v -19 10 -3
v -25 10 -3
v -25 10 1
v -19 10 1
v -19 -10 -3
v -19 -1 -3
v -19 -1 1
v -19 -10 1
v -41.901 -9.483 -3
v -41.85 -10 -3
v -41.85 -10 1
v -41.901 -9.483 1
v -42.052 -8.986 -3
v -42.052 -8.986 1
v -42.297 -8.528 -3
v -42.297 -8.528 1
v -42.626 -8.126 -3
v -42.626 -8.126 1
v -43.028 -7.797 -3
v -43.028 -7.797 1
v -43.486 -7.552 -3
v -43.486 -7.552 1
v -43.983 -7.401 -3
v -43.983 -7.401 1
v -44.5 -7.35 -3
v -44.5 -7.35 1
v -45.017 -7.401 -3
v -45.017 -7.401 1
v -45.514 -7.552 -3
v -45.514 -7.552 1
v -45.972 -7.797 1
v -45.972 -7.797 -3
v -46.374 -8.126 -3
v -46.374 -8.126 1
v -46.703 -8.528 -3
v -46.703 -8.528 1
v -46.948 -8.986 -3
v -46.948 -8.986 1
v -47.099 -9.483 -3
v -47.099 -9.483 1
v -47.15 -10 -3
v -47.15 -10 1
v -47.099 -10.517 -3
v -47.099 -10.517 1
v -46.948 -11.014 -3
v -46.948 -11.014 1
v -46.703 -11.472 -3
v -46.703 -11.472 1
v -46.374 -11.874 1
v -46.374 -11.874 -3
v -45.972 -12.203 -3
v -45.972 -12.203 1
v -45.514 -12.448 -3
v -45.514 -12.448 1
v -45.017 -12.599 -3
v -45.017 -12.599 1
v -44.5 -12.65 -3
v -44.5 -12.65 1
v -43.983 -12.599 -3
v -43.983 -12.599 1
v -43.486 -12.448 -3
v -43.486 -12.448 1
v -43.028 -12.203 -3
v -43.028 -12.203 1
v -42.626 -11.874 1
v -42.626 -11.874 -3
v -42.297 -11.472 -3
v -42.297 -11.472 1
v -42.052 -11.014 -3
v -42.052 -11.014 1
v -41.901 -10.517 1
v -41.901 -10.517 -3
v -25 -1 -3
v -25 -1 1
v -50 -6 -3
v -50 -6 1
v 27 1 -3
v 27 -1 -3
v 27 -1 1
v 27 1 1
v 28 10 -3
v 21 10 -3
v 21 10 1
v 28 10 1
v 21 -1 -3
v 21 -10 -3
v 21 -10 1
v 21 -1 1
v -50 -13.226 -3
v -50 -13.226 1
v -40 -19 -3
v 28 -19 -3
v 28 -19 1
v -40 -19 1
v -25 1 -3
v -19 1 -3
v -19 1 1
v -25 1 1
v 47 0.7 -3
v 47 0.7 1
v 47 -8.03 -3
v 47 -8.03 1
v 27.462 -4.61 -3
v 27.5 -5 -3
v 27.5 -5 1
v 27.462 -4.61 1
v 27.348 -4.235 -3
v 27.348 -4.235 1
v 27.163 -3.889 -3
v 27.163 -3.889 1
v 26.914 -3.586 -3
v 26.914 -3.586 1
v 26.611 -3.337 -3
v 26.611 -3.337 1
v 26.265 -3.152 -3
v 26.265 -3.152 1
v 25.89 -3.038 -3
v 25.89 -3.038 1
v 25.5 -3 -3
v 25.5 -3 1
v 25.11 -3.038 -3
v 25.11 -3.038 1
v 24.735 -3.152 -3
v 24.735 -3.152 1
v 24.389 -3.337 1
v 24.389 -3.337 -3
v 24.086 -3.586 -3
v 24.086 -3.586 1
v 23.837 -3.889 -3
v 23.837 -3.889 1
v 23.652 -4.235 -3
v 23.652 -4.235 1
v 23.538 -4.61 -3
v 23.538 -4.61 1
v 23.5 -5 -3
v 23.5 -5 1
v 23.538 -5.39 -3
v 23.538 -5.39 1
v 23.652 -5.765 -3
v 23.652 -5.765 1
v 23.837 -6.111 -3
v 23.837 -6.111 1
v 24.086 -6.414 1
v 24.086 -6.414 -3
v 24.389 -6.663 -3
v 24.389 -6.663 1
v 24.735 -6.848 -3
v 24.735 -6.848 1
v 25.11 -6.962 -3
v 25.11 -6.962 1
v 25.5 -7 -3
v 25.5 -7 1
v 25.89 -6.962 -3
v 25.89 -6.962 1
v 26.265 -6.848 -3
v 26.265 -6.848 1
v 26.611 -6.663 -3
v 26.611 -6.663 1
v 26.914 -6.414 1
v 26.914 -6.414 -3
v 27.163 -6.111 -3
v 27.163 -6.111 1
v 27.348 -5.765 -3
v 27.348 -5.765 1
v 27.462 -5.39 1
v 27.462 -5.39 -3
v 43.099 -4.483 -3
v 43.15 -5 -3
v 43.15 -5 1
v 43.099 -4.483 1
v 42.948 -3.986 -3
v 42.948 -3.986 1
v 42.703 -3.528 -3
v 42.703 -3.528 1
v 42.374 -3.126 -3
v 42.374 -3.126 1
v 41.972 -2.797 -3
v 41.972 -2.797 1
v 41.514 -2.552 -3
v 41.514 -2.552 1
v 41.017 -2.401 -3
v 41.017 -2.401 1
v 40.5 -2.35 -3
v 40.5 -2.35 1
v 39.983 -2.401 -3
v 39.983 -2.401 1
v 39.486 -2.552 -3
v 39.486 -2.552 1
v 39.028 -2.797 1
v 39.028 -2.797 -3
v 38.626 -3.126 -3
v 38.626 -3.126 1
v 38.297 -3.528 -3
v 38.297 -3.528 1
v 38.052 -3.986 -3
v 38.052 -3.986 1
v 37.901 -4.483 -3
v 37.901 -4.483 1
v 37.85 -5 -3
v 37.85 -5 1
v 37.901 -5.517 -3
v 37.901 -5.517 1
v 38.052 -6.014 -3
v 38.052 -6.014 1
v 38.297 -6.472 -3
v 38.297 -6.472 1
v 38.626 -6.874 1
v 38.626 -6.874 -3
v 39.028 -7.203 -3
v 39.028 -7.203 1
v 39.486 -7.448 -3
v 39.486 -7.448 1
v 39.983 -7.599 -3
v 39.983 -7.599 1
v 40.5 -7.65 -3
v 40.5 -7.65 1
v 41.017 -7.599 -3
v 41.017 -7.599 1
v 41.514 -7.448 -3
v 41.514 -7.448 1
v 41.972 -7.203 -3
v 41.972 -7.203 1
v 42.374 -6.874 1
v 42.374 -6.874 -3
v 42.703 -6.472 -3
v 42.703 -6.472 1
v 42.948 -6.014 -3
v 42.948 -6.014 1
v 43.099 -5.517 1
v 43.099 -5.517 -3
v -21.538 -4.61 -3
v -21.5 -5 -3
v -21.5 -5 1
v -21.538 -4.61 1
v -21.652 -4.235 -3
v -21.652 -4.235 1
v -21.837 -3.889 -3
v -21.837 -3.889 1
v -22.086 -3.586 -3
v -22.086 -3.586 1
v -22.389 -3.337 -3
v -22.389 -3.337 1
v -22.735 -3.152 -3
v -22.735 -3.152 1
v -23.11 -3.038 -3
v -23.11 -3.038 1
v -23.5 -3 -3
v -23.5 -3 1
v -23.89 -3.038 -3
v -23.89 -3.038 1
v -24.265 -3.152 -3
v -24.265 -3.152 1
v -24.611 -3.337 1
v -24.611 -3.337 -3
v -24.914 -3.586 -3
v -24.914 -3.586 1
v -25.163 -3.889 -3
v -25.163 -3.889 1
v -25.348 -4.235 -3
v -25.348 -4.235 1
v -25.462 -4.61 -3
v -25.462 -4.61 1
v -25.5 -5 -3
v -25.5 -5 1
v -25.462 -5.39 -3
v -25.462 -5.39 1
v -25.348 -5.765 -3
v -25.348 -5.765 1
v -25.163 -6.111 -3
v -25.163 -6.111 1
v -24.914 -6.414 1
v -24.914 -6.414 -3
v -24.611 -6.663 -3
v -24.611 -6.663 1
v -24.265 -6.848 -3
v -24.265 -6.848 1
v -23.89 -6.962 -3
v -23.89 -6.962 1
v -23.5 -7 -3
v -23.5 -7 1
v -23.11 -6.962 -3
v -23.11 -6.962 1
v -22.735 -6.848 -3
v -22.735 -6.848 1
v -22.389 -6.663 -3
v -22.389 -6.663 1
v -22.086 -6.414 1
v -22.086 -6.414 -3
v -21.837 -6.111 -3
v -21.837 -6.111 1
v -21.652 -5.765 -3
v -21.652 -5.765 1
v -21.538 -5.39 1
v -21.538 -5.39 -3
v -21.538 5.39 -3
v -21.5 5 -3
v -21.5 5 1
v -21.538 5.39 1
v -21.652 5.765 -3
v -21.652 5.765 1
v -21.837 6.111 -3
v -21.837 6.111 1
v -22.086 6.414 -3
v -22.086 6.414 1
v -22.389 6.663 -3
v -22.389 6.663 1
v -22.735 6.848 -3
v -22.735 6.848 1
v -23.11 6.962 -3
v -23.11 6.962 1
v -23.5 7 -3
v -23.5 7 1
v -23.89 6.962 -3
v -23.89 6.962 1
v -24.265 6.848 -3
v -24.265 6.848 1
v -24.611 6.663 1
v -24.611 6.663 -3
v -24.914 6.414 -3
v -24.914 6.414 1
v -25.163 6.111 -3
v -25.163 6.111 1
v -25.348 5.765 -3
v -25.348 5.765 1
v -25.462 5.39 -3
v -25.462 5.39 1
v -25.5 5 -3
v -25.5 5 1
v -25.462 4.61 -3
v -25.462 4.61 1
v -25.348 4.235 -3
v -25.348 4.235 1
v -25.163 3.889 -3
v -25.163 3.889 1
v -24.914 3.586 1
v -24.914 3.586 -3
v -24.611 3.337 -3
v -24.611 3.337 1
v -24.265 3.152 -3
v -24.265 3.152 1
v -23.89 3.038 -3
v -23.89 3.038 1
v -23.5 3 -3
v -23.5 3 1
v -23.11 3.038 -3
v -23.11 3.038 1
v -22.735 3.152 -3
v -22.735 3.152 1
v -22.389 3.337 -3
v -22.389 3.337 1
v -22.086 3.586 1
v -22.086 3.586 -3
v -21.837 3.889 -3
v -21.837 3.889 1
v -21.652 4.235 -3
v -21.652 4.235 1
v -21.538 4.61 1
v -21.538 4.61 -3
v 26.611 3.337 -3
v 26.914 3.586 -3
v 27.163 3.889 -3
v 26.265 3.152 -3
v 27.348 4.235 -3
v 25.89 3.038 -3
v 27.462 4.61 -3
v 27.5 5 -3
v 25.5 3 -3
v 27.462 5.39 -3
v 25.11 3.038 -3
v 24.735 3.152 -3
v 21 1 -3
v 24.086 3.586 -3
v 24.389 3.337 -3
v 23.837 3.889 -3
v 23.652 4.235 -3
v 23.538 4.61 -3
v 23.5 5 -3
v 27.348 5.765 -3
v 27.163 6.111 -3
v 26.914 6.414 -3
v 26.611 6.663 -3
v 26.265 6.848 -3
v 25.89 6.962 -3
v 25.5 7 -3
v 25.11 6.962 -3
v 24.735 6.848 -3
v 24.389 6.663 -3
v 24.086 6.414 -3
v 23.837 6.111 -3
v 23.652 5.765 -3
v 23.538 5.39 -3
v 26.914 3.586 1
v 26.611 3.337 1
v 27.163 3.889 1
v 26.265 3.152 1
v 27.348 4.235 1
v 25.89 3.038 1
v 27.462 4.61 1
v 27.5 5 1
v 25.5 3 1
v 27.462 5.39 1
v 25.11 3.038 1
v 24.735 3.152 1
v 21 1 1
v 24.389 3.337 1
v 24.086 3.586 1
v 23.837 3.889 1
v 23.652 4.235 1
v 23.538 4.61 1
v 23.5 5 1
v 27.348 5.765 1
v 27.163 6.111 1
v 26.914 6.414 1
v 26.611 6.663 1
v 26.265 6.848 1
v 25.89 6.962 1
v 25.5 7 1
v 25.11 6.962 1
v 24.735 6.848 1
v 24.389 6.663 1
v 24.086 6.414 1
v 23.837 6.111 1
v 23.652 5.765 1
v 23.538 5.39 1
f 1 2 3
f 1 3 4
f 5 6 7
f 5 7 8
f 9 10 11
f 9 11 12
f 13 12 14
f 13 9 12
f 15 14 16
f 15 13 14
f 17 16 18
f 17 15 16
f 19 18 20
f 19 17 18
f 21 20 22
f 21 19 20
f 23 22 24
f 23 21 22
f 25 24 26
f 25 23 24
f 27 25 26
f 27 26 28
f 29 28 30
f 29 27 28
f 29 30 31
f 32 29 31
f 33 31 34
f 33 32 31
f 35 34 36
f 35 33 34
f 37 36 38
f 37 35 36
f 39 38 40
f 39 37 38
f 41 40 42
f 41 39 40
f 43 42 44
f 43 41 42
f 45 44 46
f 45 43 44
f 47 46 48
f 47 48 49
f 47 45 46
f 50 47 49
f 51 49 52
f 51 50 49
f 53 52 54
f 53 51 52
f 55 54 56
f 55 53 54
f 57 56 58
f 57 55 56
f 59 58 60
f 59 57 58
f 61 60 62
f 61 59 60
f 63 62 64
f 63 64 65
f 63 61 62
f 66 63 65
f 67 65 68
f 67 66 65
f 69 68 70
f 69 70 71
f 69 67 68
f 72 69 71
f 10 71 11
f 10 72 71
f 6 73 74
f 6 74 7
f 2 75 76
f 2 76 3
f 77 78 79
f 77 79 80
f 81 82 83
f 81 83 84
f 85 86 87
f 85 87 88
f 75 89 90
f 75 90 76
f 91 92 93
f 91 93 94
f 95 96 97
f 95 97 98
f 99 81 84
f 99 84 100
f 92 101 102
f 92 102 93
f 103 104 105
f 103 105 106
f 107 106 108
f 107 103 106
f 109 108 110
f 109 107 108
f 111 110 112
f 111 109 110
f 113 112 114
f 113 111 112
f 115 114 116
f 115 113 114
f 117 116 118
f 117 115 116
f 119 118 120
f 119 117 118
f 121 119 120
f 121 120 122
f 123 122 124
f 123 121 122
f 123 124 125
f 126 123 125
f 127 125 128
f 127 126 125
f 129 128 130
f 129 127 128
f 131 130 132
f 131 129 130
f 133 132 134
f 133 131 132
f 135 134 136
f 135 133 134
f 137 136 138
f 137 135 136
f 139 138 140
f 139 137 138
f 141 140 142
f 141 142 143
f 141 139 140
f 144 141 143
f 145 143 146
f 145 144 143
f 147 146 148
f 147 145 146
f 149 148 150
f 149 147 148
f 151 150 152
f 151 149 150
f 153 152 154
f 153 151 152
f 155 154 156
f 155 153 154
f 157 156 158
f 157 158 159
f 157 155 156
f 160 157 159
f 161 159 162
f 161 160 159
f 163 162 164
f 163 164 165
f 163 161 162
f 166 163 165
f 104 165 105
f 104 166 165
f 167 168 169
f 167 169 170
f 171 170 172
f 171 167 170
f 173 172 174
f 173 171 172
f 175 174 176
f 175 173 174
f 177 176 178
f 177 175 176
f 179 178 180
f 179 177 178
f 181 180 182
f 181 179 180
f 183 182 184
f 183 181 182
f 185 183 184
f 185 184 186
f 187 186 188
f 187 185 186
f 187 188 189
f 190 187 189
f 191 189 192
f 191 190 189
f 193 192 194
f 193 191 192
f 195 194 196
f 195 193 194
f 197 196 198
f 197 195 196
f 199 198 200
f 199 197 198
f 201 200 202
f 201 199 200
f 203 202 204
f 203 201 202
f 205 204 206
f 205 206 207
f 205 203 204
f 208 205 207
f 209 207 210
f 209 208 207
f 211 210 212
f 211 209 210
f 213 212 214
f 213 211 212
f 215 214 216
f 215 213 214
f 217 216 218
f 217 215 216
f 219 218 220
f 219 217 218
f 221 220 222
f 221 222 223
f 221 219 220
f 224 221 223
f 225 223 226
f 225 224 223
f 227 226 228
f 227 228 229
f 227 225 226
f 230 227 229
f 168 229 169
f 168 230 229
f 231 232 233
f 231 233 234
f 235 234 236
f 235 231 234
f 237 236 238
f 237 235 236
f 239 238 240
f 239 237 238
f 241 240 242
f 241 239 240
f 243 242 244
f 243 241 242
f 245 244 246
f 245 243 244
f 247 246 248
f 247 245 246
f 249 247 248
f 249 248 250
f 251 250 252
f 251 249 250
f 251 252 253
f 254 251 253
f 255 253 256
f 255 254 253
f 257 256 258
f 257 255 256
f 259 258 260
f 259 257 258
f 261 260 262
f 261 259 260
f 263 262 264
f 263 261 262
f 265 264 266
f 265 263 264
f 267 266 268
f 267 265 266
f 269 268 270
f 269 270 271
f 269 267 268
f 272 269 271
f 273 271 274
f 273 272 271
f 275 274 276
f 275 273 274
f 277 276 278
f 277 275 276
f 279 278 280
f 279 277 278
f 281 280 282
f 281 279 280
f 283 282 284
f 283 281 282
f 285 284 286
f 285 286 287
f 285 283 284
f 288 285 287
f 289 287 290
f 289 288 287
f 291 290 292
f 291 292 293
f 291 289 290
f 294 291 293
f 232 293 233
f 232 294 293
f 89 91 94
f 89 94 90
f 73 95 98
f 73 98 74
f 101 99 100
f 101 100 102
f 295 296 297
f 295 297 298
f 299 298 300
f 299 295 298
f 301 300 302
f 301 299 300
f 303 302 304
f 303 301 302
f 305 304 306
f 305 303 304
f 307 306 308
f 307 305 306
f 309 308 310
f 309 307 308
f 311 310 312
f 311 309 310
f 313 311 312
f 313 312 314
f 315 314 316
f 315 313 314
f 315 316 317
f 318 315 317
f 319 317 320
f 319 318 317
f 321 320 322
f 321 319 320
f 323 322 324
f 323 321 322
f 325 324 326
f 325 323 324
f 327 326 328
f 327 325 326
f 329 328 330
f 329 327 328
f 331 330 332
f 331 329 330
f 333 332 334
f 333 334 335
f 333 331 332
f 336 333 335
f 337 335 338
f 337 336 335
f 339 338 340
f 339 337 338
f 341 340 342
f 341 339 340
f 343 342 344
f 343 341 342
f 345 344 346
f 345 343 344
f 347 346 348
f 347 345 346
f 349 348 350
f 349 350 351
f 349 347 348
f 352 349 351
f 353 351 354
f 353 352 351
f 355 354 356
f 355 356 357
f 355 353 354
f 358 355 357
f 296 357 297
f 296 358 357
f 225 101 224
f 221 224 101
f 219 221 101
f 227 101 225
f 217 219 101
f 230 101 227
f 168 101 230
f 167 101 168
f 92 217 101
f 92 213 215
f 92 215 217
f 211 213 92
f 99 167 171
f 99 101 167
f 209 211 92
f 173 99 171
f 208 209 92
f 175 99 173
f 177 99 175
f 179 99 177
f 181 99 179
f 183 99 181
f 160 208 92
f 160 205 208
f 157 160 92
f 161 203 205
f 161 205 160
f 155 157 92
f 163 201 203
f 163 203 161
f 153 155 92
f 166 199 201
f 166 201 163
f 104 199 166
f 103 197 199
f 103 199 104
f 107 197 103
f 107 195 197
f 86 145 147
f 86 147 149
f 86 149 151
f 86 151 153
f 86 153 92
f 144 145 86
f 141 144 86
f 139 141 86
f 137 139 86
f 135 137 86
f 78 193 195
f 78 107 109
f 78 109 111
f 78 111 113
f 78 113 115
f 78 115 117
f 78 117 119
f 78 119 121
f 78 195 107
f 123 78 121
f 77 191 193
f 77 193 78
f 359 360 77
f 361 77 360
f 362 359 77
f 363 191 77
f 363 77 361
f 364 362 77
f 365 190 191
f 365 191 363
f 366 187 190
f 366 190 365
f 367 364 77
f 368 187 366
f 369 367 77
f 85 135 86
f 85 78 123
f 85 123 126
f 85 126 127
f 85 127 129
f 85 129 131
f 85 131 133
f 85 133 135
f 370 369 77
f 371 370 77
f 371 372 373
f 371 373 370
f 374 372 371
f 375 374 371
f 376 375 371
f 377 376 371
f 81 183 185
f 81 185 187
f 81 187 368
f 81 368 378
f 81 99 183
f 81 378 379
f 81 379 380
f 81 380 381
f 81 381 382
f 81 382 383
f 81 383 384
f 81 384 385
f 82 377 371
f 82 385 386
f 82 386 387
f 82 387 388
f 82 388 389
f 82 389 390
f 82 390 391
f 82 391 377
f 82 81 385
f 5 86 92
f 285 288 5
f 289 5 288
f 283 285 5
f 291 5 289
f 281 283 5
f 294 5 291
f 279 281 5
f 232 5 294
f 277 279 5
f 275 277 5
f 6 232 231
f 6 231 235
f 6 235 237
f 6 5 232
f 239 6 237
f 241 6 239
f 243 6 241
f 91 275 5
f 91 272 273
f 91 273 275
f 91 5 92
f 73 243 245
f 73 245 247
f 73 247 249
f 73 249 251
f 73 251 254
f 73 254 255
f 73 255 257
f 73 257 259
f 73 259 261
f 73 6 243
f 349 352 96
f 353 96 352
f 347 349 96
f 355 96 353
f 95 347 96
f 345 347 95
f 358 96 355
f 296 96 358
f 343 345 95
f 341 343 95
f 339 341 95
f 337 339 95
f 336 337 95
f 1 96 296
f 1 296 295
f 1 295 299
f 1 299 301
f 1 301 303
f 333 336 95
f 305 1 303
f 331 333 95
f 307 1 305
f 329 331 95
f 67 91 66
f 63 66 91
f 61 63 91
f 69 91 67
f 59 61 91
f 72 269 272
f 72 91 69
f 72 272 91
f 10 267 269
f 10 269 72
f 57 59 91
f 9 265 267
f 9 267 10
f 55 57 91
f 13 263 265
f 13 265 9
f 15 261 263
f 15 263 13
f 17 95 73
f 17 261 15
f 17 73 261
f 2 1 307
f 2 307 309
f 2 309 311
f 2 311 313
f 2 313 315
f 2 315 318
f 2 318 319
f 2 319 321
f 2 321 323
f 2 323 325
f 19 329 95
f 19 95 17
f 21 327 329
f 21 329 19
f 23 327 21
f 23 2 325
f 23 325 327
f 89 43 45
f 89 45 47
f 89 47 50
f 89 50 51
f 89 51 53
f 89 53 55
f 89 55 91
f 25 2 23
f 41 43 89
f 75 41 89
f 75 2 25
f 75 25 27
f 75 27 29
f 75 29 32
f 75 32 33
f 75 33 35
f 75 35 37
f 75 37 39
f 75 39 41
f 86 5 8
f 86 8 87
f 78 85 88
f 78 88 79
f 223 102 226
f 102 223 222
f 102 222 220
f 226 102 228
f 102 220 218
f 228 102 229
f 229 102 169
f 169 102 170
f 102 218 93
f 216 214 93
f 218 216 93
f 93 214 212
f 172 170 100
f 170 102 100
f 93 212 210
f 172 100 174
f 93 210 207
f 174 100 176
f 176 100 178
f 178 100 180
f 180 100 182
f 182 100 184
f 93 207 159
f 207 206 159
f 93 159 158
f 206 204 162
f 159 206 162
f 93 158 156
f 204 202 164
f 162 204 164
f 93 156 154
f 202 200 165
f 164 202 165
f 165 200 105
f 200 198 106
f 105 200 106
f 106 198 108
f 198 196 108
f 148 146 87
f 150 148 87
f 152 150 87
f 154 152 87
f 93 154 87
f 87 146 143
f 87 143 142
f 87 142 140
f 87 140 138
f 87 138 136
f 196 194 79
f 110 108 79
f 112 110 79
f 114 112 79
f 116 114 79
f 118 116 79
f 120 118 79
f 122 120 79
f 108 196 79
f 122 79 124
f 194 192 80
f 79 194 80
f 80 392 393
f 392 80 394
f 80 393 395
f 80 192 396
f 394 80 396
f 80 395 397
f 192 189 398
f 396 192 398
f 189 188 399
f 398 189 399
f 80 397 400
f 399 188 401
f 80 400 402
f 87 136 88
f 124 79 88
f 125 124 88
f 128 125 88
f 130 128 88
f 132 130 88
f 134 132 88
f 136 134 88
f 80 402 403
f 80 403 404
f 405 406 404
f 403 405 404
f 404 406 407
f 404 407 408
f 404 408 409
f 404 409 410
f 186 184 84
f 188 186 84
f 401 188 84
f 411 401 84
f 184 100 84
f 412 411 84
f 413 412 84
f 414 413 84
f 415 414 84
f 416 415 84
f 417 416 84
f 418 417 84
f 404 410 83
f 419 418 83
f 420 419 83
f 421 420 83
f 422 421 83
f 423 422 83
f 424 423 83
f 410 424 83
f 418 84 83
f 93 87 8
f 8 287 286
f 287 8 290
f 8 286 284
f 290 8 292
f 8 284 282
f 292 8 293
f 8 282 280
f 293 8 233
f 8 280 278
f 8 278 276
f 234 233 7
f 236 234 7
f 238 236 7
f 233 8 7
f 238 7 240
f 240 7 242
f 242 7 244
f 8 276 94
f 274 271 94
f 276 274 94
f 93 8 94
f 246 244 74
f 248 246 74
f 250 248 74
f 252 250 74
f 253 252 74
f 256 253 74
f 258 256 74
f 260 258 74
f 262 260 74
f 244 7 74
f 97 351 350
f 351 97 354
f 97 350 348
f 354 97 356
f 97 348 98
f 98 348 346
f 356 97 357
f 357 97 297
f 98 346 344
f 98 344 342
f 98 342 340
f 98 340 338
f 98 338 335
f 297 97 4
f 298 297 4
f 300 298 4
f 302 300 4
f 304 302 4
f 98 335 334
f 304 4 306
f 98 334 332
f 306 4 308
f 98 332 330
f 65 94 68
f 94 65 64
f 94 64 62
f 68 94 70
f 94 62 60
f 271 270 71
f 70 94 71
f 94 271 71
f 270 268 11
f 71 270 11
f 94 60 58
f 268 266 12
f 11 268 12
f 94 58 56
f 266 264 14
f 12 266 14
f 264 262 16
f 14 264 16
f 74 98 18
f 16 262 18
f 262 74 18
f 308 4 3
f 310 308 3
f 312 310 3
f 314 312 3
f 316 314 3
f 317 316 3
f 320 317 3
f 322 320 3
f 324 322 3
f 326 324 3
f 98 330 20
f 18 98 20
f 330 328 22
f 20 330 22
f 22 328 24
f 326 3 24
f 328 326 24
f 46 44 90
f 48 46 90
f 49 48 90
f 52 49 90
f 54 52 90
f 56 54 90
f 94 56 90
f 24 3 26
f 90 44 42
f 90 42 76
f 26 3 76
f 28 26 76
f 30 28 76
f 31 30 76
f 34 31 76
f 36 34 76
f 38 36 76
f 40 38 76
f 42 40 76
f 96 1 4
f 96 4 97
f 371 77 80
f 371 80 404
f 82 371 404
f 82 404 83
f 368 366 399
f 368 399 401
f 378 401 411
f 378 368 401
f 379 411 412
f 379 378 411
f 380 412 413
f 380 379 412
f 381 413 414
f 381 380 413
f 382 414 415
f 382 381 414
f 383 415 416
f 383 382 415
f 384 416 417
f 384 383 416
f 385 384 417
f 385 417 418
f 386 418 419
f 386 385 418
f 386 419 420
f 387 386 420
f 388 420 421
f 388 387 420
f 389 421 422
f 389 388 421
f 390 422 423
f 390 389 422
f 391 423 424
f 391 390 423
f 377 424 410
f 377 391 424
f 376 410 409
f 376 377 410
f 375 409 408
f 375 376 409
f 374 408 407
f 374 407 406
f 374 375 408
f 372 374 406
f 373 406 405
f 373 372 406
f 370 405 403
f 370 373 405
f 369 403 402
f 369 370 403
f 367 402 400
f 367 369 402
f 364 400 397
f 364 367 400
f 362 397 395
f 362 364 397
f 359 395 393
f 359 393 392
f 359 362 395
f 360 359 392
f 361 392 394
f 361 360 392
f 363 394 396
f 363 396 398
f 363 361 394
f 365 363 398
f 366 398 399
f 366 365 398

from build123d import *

# Parameters (mm, degrees)
SKETCH005_R   = 2
SKETCH005_R_2 = 2.65
PAD_DEPTH     = 4


with BuildPart() as part:
    # Sketch005 → Pad (new body)
    with BuildSketch(Plane.XY.offset(-3)):
        Polygon((-25, 10), (-19, 10), (-19, 1), (-25, 1), (-25, -1), (-19, -1), (-19, -10), (21, -10), (21, -1), (27, -1), (27, 1), (21, 1), (21, 10), (28, 10), (47, 0.7), (47, -8.030345), (28, -19), (-40, -19), (-50, -13.226497), (-50, -6), align=None)
        with Locations((-23.5, 5)):
            Circle(SKETCH005_R, mode=Mode.SUBTRACT)
        with Locations((-23.5, -5)):
            Circle(SKETCH005_R, mode=Mode.SUBTRACT)
        with Locations((25.5, 5)):
            Circle(SKETCH005_R, mode=Mode.SUBTRACT)
        with Locations((25.5, -5)):
            Circle(SKETCH005_R, mode=Mode.SUBTRACT)
        with Locations((40.5, -5)):
            Circle(SKETCH005_R_2, mode=Mode.SUBTRACT)
        with Locations((-44.5, -10)):
            Circle(SKETCH005_R_2, mode=Mode.SUBTRACT)
    extrude(amount=PAD_DEPTH)


solid = part.part
